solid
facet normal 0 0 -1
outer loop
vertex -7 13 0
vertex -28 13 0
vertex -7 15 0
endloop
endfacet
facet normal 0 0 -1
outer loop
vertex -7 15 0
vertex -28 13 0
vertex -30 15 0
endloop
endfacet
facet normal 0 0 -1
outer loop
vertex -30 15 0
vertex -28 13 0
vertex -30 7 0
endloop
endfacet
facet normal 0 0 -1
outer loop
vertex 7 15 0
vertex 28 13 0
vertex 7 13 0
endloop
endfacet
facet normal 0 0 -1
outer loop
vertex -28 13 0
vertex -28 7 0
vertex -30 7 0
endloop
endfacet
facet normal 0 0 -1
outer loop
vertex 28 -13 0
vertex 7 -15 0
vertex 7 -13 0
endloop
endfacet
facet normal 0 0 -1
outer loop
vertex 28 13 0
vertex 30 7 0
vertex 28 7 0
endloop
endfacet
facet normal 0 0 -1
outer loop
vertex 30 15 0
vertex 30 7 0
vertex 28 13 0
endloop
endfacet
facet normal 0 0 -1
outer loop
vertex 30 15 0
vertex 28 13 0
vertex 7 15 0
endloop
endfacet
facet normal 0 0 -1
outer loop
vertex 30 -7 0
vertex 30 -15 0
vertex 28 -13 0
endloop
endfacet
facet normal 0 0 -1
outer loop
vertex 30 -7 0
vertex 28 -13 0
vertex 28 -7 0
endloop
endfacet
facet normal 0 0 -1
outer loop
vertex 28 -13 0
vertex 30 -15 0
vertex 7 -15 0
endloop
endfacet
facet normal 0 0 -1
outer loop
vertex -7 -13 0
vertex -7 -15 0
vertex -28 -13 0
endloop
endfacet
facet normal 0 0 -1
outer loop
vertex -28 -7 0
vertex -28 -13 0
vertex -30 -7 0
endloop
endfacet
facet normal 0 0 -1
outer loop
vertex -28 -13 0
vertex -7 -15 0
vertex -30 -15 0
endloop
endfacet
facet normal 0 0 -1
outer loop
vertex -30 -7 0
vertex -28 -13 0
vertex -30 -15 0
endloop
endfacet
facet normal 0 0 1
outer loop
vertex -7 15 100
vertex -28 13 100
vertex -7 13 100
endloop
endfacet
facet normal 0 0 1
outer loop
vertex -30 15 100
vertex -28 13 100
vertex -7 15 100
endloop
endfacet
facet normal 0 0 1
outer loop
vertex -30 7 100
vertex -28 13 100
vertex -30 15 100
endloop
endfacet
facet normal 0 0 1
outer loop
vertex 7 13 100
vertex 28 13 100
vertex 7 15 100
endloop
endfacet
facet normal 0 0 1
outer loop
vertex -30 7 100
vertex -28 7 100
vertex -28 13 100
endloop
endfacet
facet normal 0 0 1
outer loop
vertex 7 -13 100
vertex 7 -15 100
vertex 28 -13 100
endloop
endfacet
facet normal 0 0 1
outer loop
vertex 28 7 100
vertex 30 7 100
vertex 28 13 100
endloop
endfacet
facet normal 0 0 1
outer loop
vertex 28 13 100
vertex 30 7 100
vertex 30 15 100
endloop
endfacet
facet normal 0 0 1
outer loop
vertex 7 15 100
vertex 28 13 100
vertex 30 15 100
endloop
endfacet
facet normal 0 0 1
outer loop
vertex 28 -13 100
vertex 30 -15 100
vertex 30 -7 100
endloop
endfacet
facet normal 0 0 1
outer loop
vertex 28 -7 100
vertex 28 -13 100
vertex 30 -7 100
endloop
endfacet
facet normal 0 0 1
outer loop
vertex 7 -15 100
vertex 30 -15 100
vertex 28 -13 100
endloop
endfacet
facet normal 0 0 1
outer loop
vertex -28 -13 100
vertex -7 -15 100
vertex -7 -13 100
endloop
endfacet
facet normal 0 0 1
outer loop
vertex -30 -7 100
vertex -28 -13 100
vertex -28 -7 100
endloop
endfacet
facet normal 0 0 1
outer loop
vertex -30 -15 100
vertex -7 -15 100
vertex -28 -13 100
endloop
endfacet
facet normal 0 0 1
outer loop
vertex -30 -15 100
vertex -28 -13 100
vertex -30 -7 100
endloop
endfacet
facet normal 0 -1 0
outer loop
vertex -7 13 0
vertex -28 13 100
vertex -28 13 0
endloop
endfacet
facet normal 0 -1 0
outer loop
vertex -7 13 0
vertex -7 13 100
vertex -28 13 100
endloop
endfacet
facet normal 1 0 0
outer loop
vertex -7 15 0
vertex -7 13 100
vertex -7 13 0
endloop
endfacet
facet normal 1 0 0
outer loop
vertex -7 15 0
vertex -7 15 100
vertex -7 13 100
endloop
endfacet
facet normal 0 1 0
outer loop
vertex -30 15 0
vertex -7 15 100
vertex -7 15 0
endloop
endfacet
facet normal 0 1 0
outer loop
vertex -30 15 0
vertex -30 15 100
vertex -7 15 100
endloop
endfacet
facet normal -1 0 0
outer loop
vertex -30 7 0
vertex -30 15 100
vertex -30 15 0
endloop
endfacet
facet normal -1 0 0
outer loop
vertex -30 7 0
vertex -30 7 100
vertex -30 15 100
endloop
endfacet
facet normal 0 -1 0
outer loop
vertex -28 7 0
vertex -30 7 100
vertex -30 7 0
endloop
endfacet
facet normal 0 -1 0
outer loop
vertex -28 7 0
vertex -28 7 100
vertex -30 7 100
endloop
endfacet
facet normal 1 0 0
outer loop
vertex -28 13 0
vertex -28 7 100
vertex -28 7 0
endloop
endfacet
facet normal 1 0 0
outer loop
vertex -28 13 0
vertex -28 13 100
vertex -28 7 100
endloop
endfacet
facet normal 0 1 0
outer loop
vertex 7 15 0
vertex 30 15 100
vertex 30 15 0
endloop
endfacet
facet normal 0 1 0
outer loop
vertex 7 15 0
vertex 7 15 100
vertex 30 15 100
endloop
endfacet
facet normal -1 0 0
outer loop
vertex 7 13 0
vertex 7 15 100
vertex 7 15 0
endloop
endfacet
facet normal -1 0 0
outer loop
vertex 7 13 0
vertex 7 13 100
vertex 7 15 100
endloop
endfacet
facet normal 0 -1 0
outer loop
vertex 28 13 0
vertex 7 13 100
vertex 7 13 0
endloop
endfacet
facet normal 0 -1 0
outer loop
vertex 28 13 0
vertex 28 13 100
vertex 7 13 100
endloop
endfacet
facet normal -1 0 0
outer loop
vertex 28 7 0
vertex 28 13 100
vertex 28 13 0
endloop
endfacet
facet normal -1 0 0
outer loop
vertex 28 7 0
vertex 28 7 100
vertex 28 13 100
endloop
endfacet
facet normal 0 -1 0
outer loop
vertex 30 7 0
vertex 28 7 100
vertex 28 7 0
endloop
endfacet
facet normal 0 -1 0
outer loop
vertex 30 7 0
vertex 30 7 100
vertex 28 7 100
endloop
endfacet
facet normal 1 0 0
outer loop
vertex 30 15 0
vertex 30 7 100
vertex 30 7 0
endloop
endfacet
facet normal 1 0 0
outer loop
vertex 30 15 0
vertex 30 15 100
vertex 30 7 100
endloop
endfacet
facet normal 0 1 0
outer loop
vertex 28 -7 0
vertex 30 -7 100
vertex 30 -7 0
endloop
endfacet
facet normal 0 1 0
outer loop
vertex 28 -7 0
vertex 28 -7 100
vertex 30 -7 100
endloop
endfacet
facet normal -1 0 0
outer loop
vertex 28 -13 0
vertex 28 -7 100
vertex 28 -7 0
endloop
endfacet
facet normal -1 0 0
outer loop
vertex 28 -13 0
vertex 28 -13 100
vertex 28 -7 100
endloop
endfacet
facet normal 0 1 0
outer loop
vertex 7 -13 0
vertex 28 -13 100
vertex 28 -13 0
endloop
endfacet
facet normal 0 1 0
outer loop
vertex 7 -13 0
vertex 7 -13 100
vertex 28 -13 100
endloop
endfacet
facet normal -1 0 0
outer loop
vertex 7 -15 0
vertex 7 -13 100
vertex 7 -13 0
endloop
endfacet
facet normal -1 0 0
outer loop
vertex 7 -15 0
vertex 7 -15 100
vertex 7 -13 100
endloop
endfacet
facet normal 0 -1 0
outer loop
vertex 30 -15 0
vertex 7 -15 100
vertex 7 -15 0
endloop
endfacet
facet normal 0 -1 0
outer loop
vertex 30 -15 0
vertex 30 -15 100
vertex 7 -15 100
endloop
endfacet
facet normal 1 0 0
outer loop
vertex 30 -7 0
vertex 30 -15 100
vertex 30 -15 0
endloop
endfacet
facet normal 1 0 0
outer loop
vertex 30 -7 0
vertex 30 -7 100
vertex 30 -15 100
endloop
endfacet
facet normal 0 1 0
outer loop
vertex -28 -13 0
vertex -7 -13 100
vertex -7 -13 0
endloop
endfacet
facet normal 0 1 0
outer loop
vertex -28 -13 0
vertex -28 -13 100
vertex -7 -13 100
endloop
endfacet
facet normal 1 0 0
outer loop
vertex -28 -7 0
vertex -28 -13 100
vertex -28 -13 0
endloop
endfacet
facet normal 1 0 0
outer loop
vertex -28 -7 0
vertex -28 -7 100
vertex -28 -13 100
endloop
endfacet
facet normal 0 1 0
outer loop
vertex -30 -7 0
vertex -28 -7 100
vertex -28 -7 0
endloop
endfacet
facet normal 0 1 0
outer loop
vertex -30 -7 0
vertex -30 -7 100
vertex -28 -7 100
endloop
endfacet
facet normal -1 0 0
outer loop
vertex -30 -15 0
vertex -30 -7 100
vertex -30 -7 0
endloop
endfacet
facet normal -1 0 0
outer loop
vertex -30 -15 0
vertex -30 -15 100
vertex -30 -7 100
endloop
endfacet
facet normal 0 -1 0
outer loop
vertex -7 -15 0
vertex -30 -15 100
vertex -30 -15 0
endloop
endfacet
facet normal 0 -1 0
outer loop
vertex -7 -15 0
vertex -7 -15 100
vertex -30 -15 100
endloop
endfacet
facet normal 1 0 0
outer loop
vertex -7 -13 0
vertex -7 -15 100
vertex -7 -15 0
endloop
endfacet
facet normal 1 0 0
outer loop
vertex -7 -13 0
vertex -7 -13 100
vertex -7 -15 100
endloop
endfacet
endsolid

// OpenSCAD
$fn = 96;

// ===== Parameters (mm) =====
length = 100;   // extrusion length (Z)
w = 60;         // X size
h = 30;         // Y size

// Typical 30x60-ish profile features (simplified but not just a tube)
wall = 2.0;             // outer wall thickness
slot_open_w = 8.0;      // slot mouth width at surface
slot_depth = 7.0;       // how far slot cuts inward from each face
slot_cavity_w = 14.0;   // wider internal cavity width (T-slot undercut)
slot_cavity_depth = 3.5;// depth of the wider cavity (from slot bottom inward)
center_hole_d = 6.0;    // center bore

// Internal webs to keep one connected solid and look like extrusion
web_t = 2.0;            // web thickness
web_clear = 1.0;        // clearance from inner cavity to web ends

eps = 0.05;

// 2D T-slot cut oriented to cut from +Y face inward (toward -Y)
module tslot2d(face_len, depth, open_w, cavity_w, cavity_depth) {
    // Build a "T" void: narrow mouth + wider undercut near the bottom.
    // Coordinates: y=0 at face, y increases inward.
    union() {
        // Mouth
        translate([-open_w/2, 0])
            square([open_w, depth + eps], center=false);

        // Undercut cavity near the bottom of the slot
        translate([-cavity_w/2, depth - cavity_depth])
            square([cavity_w, cavity_depth + eps], center=false);
    }
}

module extrusion_30x60(len=100) {
    // Create 2D cross-section then extrude along Z
    linear_extrude(height=len, center=false, convexity=10)
    difference() {
        // ---- Solid base: outer rectangle + internal webs (so it's not just a tube) ----
        union() {
            // Outer boundary
            square([w, h], center=true);

            // Internal webs (cross) to mimic typical extrusion structure
            // Vertical web
            square([web_t, (h - 2*wall) - 2*web_clear], center=true);
            // Horizontal web
            square([(w - 2*wall) - 2*web_clear, web_t], center=true);
        }

        // ---- Main inner cavity (keeps outer walls) ----
        square([w - 2*wall, h - 2*wall], center=true);

        // ---- Center bore ----
        circle(d=center_hole_d);

        // ---- T-slots on all four faces (2D cuts) ----
        // Top (+Y): place slot so its mouth starts at y=+h/2 and cuts inward
        translate([0, h/2 - slot_depth])
            tslot2d(w, slot_depth, slot_open_w, slot_cavity_w, slot_cavity_depth);

        // Bottom (-Y)
        mirror([0, 1, 0])
            translate([0, h/2 - slot_depth])
                tslot2d(w, slot_depth, slot_open_w, slot_cavity_w, slot_cavity_depth);

        // Right (+X): rotate slot to cut from +X inward
        rotate(90)
            translate([0, w/2 - slot_depth])
                tslot2d(h, slot_depth, slot_open_w, slot_cavity_w, slot_cavity_depth);

        // Left (-X)
        rotate(90)
            mirror([0, 1, 0])
                translate([0, w/2 - slot_depth])
                    tslot2d(h, slot_depth, slot_open_w, slot_cavity_w, slot_cavity_depth);
    }
}

extrusion_30x60(length);
